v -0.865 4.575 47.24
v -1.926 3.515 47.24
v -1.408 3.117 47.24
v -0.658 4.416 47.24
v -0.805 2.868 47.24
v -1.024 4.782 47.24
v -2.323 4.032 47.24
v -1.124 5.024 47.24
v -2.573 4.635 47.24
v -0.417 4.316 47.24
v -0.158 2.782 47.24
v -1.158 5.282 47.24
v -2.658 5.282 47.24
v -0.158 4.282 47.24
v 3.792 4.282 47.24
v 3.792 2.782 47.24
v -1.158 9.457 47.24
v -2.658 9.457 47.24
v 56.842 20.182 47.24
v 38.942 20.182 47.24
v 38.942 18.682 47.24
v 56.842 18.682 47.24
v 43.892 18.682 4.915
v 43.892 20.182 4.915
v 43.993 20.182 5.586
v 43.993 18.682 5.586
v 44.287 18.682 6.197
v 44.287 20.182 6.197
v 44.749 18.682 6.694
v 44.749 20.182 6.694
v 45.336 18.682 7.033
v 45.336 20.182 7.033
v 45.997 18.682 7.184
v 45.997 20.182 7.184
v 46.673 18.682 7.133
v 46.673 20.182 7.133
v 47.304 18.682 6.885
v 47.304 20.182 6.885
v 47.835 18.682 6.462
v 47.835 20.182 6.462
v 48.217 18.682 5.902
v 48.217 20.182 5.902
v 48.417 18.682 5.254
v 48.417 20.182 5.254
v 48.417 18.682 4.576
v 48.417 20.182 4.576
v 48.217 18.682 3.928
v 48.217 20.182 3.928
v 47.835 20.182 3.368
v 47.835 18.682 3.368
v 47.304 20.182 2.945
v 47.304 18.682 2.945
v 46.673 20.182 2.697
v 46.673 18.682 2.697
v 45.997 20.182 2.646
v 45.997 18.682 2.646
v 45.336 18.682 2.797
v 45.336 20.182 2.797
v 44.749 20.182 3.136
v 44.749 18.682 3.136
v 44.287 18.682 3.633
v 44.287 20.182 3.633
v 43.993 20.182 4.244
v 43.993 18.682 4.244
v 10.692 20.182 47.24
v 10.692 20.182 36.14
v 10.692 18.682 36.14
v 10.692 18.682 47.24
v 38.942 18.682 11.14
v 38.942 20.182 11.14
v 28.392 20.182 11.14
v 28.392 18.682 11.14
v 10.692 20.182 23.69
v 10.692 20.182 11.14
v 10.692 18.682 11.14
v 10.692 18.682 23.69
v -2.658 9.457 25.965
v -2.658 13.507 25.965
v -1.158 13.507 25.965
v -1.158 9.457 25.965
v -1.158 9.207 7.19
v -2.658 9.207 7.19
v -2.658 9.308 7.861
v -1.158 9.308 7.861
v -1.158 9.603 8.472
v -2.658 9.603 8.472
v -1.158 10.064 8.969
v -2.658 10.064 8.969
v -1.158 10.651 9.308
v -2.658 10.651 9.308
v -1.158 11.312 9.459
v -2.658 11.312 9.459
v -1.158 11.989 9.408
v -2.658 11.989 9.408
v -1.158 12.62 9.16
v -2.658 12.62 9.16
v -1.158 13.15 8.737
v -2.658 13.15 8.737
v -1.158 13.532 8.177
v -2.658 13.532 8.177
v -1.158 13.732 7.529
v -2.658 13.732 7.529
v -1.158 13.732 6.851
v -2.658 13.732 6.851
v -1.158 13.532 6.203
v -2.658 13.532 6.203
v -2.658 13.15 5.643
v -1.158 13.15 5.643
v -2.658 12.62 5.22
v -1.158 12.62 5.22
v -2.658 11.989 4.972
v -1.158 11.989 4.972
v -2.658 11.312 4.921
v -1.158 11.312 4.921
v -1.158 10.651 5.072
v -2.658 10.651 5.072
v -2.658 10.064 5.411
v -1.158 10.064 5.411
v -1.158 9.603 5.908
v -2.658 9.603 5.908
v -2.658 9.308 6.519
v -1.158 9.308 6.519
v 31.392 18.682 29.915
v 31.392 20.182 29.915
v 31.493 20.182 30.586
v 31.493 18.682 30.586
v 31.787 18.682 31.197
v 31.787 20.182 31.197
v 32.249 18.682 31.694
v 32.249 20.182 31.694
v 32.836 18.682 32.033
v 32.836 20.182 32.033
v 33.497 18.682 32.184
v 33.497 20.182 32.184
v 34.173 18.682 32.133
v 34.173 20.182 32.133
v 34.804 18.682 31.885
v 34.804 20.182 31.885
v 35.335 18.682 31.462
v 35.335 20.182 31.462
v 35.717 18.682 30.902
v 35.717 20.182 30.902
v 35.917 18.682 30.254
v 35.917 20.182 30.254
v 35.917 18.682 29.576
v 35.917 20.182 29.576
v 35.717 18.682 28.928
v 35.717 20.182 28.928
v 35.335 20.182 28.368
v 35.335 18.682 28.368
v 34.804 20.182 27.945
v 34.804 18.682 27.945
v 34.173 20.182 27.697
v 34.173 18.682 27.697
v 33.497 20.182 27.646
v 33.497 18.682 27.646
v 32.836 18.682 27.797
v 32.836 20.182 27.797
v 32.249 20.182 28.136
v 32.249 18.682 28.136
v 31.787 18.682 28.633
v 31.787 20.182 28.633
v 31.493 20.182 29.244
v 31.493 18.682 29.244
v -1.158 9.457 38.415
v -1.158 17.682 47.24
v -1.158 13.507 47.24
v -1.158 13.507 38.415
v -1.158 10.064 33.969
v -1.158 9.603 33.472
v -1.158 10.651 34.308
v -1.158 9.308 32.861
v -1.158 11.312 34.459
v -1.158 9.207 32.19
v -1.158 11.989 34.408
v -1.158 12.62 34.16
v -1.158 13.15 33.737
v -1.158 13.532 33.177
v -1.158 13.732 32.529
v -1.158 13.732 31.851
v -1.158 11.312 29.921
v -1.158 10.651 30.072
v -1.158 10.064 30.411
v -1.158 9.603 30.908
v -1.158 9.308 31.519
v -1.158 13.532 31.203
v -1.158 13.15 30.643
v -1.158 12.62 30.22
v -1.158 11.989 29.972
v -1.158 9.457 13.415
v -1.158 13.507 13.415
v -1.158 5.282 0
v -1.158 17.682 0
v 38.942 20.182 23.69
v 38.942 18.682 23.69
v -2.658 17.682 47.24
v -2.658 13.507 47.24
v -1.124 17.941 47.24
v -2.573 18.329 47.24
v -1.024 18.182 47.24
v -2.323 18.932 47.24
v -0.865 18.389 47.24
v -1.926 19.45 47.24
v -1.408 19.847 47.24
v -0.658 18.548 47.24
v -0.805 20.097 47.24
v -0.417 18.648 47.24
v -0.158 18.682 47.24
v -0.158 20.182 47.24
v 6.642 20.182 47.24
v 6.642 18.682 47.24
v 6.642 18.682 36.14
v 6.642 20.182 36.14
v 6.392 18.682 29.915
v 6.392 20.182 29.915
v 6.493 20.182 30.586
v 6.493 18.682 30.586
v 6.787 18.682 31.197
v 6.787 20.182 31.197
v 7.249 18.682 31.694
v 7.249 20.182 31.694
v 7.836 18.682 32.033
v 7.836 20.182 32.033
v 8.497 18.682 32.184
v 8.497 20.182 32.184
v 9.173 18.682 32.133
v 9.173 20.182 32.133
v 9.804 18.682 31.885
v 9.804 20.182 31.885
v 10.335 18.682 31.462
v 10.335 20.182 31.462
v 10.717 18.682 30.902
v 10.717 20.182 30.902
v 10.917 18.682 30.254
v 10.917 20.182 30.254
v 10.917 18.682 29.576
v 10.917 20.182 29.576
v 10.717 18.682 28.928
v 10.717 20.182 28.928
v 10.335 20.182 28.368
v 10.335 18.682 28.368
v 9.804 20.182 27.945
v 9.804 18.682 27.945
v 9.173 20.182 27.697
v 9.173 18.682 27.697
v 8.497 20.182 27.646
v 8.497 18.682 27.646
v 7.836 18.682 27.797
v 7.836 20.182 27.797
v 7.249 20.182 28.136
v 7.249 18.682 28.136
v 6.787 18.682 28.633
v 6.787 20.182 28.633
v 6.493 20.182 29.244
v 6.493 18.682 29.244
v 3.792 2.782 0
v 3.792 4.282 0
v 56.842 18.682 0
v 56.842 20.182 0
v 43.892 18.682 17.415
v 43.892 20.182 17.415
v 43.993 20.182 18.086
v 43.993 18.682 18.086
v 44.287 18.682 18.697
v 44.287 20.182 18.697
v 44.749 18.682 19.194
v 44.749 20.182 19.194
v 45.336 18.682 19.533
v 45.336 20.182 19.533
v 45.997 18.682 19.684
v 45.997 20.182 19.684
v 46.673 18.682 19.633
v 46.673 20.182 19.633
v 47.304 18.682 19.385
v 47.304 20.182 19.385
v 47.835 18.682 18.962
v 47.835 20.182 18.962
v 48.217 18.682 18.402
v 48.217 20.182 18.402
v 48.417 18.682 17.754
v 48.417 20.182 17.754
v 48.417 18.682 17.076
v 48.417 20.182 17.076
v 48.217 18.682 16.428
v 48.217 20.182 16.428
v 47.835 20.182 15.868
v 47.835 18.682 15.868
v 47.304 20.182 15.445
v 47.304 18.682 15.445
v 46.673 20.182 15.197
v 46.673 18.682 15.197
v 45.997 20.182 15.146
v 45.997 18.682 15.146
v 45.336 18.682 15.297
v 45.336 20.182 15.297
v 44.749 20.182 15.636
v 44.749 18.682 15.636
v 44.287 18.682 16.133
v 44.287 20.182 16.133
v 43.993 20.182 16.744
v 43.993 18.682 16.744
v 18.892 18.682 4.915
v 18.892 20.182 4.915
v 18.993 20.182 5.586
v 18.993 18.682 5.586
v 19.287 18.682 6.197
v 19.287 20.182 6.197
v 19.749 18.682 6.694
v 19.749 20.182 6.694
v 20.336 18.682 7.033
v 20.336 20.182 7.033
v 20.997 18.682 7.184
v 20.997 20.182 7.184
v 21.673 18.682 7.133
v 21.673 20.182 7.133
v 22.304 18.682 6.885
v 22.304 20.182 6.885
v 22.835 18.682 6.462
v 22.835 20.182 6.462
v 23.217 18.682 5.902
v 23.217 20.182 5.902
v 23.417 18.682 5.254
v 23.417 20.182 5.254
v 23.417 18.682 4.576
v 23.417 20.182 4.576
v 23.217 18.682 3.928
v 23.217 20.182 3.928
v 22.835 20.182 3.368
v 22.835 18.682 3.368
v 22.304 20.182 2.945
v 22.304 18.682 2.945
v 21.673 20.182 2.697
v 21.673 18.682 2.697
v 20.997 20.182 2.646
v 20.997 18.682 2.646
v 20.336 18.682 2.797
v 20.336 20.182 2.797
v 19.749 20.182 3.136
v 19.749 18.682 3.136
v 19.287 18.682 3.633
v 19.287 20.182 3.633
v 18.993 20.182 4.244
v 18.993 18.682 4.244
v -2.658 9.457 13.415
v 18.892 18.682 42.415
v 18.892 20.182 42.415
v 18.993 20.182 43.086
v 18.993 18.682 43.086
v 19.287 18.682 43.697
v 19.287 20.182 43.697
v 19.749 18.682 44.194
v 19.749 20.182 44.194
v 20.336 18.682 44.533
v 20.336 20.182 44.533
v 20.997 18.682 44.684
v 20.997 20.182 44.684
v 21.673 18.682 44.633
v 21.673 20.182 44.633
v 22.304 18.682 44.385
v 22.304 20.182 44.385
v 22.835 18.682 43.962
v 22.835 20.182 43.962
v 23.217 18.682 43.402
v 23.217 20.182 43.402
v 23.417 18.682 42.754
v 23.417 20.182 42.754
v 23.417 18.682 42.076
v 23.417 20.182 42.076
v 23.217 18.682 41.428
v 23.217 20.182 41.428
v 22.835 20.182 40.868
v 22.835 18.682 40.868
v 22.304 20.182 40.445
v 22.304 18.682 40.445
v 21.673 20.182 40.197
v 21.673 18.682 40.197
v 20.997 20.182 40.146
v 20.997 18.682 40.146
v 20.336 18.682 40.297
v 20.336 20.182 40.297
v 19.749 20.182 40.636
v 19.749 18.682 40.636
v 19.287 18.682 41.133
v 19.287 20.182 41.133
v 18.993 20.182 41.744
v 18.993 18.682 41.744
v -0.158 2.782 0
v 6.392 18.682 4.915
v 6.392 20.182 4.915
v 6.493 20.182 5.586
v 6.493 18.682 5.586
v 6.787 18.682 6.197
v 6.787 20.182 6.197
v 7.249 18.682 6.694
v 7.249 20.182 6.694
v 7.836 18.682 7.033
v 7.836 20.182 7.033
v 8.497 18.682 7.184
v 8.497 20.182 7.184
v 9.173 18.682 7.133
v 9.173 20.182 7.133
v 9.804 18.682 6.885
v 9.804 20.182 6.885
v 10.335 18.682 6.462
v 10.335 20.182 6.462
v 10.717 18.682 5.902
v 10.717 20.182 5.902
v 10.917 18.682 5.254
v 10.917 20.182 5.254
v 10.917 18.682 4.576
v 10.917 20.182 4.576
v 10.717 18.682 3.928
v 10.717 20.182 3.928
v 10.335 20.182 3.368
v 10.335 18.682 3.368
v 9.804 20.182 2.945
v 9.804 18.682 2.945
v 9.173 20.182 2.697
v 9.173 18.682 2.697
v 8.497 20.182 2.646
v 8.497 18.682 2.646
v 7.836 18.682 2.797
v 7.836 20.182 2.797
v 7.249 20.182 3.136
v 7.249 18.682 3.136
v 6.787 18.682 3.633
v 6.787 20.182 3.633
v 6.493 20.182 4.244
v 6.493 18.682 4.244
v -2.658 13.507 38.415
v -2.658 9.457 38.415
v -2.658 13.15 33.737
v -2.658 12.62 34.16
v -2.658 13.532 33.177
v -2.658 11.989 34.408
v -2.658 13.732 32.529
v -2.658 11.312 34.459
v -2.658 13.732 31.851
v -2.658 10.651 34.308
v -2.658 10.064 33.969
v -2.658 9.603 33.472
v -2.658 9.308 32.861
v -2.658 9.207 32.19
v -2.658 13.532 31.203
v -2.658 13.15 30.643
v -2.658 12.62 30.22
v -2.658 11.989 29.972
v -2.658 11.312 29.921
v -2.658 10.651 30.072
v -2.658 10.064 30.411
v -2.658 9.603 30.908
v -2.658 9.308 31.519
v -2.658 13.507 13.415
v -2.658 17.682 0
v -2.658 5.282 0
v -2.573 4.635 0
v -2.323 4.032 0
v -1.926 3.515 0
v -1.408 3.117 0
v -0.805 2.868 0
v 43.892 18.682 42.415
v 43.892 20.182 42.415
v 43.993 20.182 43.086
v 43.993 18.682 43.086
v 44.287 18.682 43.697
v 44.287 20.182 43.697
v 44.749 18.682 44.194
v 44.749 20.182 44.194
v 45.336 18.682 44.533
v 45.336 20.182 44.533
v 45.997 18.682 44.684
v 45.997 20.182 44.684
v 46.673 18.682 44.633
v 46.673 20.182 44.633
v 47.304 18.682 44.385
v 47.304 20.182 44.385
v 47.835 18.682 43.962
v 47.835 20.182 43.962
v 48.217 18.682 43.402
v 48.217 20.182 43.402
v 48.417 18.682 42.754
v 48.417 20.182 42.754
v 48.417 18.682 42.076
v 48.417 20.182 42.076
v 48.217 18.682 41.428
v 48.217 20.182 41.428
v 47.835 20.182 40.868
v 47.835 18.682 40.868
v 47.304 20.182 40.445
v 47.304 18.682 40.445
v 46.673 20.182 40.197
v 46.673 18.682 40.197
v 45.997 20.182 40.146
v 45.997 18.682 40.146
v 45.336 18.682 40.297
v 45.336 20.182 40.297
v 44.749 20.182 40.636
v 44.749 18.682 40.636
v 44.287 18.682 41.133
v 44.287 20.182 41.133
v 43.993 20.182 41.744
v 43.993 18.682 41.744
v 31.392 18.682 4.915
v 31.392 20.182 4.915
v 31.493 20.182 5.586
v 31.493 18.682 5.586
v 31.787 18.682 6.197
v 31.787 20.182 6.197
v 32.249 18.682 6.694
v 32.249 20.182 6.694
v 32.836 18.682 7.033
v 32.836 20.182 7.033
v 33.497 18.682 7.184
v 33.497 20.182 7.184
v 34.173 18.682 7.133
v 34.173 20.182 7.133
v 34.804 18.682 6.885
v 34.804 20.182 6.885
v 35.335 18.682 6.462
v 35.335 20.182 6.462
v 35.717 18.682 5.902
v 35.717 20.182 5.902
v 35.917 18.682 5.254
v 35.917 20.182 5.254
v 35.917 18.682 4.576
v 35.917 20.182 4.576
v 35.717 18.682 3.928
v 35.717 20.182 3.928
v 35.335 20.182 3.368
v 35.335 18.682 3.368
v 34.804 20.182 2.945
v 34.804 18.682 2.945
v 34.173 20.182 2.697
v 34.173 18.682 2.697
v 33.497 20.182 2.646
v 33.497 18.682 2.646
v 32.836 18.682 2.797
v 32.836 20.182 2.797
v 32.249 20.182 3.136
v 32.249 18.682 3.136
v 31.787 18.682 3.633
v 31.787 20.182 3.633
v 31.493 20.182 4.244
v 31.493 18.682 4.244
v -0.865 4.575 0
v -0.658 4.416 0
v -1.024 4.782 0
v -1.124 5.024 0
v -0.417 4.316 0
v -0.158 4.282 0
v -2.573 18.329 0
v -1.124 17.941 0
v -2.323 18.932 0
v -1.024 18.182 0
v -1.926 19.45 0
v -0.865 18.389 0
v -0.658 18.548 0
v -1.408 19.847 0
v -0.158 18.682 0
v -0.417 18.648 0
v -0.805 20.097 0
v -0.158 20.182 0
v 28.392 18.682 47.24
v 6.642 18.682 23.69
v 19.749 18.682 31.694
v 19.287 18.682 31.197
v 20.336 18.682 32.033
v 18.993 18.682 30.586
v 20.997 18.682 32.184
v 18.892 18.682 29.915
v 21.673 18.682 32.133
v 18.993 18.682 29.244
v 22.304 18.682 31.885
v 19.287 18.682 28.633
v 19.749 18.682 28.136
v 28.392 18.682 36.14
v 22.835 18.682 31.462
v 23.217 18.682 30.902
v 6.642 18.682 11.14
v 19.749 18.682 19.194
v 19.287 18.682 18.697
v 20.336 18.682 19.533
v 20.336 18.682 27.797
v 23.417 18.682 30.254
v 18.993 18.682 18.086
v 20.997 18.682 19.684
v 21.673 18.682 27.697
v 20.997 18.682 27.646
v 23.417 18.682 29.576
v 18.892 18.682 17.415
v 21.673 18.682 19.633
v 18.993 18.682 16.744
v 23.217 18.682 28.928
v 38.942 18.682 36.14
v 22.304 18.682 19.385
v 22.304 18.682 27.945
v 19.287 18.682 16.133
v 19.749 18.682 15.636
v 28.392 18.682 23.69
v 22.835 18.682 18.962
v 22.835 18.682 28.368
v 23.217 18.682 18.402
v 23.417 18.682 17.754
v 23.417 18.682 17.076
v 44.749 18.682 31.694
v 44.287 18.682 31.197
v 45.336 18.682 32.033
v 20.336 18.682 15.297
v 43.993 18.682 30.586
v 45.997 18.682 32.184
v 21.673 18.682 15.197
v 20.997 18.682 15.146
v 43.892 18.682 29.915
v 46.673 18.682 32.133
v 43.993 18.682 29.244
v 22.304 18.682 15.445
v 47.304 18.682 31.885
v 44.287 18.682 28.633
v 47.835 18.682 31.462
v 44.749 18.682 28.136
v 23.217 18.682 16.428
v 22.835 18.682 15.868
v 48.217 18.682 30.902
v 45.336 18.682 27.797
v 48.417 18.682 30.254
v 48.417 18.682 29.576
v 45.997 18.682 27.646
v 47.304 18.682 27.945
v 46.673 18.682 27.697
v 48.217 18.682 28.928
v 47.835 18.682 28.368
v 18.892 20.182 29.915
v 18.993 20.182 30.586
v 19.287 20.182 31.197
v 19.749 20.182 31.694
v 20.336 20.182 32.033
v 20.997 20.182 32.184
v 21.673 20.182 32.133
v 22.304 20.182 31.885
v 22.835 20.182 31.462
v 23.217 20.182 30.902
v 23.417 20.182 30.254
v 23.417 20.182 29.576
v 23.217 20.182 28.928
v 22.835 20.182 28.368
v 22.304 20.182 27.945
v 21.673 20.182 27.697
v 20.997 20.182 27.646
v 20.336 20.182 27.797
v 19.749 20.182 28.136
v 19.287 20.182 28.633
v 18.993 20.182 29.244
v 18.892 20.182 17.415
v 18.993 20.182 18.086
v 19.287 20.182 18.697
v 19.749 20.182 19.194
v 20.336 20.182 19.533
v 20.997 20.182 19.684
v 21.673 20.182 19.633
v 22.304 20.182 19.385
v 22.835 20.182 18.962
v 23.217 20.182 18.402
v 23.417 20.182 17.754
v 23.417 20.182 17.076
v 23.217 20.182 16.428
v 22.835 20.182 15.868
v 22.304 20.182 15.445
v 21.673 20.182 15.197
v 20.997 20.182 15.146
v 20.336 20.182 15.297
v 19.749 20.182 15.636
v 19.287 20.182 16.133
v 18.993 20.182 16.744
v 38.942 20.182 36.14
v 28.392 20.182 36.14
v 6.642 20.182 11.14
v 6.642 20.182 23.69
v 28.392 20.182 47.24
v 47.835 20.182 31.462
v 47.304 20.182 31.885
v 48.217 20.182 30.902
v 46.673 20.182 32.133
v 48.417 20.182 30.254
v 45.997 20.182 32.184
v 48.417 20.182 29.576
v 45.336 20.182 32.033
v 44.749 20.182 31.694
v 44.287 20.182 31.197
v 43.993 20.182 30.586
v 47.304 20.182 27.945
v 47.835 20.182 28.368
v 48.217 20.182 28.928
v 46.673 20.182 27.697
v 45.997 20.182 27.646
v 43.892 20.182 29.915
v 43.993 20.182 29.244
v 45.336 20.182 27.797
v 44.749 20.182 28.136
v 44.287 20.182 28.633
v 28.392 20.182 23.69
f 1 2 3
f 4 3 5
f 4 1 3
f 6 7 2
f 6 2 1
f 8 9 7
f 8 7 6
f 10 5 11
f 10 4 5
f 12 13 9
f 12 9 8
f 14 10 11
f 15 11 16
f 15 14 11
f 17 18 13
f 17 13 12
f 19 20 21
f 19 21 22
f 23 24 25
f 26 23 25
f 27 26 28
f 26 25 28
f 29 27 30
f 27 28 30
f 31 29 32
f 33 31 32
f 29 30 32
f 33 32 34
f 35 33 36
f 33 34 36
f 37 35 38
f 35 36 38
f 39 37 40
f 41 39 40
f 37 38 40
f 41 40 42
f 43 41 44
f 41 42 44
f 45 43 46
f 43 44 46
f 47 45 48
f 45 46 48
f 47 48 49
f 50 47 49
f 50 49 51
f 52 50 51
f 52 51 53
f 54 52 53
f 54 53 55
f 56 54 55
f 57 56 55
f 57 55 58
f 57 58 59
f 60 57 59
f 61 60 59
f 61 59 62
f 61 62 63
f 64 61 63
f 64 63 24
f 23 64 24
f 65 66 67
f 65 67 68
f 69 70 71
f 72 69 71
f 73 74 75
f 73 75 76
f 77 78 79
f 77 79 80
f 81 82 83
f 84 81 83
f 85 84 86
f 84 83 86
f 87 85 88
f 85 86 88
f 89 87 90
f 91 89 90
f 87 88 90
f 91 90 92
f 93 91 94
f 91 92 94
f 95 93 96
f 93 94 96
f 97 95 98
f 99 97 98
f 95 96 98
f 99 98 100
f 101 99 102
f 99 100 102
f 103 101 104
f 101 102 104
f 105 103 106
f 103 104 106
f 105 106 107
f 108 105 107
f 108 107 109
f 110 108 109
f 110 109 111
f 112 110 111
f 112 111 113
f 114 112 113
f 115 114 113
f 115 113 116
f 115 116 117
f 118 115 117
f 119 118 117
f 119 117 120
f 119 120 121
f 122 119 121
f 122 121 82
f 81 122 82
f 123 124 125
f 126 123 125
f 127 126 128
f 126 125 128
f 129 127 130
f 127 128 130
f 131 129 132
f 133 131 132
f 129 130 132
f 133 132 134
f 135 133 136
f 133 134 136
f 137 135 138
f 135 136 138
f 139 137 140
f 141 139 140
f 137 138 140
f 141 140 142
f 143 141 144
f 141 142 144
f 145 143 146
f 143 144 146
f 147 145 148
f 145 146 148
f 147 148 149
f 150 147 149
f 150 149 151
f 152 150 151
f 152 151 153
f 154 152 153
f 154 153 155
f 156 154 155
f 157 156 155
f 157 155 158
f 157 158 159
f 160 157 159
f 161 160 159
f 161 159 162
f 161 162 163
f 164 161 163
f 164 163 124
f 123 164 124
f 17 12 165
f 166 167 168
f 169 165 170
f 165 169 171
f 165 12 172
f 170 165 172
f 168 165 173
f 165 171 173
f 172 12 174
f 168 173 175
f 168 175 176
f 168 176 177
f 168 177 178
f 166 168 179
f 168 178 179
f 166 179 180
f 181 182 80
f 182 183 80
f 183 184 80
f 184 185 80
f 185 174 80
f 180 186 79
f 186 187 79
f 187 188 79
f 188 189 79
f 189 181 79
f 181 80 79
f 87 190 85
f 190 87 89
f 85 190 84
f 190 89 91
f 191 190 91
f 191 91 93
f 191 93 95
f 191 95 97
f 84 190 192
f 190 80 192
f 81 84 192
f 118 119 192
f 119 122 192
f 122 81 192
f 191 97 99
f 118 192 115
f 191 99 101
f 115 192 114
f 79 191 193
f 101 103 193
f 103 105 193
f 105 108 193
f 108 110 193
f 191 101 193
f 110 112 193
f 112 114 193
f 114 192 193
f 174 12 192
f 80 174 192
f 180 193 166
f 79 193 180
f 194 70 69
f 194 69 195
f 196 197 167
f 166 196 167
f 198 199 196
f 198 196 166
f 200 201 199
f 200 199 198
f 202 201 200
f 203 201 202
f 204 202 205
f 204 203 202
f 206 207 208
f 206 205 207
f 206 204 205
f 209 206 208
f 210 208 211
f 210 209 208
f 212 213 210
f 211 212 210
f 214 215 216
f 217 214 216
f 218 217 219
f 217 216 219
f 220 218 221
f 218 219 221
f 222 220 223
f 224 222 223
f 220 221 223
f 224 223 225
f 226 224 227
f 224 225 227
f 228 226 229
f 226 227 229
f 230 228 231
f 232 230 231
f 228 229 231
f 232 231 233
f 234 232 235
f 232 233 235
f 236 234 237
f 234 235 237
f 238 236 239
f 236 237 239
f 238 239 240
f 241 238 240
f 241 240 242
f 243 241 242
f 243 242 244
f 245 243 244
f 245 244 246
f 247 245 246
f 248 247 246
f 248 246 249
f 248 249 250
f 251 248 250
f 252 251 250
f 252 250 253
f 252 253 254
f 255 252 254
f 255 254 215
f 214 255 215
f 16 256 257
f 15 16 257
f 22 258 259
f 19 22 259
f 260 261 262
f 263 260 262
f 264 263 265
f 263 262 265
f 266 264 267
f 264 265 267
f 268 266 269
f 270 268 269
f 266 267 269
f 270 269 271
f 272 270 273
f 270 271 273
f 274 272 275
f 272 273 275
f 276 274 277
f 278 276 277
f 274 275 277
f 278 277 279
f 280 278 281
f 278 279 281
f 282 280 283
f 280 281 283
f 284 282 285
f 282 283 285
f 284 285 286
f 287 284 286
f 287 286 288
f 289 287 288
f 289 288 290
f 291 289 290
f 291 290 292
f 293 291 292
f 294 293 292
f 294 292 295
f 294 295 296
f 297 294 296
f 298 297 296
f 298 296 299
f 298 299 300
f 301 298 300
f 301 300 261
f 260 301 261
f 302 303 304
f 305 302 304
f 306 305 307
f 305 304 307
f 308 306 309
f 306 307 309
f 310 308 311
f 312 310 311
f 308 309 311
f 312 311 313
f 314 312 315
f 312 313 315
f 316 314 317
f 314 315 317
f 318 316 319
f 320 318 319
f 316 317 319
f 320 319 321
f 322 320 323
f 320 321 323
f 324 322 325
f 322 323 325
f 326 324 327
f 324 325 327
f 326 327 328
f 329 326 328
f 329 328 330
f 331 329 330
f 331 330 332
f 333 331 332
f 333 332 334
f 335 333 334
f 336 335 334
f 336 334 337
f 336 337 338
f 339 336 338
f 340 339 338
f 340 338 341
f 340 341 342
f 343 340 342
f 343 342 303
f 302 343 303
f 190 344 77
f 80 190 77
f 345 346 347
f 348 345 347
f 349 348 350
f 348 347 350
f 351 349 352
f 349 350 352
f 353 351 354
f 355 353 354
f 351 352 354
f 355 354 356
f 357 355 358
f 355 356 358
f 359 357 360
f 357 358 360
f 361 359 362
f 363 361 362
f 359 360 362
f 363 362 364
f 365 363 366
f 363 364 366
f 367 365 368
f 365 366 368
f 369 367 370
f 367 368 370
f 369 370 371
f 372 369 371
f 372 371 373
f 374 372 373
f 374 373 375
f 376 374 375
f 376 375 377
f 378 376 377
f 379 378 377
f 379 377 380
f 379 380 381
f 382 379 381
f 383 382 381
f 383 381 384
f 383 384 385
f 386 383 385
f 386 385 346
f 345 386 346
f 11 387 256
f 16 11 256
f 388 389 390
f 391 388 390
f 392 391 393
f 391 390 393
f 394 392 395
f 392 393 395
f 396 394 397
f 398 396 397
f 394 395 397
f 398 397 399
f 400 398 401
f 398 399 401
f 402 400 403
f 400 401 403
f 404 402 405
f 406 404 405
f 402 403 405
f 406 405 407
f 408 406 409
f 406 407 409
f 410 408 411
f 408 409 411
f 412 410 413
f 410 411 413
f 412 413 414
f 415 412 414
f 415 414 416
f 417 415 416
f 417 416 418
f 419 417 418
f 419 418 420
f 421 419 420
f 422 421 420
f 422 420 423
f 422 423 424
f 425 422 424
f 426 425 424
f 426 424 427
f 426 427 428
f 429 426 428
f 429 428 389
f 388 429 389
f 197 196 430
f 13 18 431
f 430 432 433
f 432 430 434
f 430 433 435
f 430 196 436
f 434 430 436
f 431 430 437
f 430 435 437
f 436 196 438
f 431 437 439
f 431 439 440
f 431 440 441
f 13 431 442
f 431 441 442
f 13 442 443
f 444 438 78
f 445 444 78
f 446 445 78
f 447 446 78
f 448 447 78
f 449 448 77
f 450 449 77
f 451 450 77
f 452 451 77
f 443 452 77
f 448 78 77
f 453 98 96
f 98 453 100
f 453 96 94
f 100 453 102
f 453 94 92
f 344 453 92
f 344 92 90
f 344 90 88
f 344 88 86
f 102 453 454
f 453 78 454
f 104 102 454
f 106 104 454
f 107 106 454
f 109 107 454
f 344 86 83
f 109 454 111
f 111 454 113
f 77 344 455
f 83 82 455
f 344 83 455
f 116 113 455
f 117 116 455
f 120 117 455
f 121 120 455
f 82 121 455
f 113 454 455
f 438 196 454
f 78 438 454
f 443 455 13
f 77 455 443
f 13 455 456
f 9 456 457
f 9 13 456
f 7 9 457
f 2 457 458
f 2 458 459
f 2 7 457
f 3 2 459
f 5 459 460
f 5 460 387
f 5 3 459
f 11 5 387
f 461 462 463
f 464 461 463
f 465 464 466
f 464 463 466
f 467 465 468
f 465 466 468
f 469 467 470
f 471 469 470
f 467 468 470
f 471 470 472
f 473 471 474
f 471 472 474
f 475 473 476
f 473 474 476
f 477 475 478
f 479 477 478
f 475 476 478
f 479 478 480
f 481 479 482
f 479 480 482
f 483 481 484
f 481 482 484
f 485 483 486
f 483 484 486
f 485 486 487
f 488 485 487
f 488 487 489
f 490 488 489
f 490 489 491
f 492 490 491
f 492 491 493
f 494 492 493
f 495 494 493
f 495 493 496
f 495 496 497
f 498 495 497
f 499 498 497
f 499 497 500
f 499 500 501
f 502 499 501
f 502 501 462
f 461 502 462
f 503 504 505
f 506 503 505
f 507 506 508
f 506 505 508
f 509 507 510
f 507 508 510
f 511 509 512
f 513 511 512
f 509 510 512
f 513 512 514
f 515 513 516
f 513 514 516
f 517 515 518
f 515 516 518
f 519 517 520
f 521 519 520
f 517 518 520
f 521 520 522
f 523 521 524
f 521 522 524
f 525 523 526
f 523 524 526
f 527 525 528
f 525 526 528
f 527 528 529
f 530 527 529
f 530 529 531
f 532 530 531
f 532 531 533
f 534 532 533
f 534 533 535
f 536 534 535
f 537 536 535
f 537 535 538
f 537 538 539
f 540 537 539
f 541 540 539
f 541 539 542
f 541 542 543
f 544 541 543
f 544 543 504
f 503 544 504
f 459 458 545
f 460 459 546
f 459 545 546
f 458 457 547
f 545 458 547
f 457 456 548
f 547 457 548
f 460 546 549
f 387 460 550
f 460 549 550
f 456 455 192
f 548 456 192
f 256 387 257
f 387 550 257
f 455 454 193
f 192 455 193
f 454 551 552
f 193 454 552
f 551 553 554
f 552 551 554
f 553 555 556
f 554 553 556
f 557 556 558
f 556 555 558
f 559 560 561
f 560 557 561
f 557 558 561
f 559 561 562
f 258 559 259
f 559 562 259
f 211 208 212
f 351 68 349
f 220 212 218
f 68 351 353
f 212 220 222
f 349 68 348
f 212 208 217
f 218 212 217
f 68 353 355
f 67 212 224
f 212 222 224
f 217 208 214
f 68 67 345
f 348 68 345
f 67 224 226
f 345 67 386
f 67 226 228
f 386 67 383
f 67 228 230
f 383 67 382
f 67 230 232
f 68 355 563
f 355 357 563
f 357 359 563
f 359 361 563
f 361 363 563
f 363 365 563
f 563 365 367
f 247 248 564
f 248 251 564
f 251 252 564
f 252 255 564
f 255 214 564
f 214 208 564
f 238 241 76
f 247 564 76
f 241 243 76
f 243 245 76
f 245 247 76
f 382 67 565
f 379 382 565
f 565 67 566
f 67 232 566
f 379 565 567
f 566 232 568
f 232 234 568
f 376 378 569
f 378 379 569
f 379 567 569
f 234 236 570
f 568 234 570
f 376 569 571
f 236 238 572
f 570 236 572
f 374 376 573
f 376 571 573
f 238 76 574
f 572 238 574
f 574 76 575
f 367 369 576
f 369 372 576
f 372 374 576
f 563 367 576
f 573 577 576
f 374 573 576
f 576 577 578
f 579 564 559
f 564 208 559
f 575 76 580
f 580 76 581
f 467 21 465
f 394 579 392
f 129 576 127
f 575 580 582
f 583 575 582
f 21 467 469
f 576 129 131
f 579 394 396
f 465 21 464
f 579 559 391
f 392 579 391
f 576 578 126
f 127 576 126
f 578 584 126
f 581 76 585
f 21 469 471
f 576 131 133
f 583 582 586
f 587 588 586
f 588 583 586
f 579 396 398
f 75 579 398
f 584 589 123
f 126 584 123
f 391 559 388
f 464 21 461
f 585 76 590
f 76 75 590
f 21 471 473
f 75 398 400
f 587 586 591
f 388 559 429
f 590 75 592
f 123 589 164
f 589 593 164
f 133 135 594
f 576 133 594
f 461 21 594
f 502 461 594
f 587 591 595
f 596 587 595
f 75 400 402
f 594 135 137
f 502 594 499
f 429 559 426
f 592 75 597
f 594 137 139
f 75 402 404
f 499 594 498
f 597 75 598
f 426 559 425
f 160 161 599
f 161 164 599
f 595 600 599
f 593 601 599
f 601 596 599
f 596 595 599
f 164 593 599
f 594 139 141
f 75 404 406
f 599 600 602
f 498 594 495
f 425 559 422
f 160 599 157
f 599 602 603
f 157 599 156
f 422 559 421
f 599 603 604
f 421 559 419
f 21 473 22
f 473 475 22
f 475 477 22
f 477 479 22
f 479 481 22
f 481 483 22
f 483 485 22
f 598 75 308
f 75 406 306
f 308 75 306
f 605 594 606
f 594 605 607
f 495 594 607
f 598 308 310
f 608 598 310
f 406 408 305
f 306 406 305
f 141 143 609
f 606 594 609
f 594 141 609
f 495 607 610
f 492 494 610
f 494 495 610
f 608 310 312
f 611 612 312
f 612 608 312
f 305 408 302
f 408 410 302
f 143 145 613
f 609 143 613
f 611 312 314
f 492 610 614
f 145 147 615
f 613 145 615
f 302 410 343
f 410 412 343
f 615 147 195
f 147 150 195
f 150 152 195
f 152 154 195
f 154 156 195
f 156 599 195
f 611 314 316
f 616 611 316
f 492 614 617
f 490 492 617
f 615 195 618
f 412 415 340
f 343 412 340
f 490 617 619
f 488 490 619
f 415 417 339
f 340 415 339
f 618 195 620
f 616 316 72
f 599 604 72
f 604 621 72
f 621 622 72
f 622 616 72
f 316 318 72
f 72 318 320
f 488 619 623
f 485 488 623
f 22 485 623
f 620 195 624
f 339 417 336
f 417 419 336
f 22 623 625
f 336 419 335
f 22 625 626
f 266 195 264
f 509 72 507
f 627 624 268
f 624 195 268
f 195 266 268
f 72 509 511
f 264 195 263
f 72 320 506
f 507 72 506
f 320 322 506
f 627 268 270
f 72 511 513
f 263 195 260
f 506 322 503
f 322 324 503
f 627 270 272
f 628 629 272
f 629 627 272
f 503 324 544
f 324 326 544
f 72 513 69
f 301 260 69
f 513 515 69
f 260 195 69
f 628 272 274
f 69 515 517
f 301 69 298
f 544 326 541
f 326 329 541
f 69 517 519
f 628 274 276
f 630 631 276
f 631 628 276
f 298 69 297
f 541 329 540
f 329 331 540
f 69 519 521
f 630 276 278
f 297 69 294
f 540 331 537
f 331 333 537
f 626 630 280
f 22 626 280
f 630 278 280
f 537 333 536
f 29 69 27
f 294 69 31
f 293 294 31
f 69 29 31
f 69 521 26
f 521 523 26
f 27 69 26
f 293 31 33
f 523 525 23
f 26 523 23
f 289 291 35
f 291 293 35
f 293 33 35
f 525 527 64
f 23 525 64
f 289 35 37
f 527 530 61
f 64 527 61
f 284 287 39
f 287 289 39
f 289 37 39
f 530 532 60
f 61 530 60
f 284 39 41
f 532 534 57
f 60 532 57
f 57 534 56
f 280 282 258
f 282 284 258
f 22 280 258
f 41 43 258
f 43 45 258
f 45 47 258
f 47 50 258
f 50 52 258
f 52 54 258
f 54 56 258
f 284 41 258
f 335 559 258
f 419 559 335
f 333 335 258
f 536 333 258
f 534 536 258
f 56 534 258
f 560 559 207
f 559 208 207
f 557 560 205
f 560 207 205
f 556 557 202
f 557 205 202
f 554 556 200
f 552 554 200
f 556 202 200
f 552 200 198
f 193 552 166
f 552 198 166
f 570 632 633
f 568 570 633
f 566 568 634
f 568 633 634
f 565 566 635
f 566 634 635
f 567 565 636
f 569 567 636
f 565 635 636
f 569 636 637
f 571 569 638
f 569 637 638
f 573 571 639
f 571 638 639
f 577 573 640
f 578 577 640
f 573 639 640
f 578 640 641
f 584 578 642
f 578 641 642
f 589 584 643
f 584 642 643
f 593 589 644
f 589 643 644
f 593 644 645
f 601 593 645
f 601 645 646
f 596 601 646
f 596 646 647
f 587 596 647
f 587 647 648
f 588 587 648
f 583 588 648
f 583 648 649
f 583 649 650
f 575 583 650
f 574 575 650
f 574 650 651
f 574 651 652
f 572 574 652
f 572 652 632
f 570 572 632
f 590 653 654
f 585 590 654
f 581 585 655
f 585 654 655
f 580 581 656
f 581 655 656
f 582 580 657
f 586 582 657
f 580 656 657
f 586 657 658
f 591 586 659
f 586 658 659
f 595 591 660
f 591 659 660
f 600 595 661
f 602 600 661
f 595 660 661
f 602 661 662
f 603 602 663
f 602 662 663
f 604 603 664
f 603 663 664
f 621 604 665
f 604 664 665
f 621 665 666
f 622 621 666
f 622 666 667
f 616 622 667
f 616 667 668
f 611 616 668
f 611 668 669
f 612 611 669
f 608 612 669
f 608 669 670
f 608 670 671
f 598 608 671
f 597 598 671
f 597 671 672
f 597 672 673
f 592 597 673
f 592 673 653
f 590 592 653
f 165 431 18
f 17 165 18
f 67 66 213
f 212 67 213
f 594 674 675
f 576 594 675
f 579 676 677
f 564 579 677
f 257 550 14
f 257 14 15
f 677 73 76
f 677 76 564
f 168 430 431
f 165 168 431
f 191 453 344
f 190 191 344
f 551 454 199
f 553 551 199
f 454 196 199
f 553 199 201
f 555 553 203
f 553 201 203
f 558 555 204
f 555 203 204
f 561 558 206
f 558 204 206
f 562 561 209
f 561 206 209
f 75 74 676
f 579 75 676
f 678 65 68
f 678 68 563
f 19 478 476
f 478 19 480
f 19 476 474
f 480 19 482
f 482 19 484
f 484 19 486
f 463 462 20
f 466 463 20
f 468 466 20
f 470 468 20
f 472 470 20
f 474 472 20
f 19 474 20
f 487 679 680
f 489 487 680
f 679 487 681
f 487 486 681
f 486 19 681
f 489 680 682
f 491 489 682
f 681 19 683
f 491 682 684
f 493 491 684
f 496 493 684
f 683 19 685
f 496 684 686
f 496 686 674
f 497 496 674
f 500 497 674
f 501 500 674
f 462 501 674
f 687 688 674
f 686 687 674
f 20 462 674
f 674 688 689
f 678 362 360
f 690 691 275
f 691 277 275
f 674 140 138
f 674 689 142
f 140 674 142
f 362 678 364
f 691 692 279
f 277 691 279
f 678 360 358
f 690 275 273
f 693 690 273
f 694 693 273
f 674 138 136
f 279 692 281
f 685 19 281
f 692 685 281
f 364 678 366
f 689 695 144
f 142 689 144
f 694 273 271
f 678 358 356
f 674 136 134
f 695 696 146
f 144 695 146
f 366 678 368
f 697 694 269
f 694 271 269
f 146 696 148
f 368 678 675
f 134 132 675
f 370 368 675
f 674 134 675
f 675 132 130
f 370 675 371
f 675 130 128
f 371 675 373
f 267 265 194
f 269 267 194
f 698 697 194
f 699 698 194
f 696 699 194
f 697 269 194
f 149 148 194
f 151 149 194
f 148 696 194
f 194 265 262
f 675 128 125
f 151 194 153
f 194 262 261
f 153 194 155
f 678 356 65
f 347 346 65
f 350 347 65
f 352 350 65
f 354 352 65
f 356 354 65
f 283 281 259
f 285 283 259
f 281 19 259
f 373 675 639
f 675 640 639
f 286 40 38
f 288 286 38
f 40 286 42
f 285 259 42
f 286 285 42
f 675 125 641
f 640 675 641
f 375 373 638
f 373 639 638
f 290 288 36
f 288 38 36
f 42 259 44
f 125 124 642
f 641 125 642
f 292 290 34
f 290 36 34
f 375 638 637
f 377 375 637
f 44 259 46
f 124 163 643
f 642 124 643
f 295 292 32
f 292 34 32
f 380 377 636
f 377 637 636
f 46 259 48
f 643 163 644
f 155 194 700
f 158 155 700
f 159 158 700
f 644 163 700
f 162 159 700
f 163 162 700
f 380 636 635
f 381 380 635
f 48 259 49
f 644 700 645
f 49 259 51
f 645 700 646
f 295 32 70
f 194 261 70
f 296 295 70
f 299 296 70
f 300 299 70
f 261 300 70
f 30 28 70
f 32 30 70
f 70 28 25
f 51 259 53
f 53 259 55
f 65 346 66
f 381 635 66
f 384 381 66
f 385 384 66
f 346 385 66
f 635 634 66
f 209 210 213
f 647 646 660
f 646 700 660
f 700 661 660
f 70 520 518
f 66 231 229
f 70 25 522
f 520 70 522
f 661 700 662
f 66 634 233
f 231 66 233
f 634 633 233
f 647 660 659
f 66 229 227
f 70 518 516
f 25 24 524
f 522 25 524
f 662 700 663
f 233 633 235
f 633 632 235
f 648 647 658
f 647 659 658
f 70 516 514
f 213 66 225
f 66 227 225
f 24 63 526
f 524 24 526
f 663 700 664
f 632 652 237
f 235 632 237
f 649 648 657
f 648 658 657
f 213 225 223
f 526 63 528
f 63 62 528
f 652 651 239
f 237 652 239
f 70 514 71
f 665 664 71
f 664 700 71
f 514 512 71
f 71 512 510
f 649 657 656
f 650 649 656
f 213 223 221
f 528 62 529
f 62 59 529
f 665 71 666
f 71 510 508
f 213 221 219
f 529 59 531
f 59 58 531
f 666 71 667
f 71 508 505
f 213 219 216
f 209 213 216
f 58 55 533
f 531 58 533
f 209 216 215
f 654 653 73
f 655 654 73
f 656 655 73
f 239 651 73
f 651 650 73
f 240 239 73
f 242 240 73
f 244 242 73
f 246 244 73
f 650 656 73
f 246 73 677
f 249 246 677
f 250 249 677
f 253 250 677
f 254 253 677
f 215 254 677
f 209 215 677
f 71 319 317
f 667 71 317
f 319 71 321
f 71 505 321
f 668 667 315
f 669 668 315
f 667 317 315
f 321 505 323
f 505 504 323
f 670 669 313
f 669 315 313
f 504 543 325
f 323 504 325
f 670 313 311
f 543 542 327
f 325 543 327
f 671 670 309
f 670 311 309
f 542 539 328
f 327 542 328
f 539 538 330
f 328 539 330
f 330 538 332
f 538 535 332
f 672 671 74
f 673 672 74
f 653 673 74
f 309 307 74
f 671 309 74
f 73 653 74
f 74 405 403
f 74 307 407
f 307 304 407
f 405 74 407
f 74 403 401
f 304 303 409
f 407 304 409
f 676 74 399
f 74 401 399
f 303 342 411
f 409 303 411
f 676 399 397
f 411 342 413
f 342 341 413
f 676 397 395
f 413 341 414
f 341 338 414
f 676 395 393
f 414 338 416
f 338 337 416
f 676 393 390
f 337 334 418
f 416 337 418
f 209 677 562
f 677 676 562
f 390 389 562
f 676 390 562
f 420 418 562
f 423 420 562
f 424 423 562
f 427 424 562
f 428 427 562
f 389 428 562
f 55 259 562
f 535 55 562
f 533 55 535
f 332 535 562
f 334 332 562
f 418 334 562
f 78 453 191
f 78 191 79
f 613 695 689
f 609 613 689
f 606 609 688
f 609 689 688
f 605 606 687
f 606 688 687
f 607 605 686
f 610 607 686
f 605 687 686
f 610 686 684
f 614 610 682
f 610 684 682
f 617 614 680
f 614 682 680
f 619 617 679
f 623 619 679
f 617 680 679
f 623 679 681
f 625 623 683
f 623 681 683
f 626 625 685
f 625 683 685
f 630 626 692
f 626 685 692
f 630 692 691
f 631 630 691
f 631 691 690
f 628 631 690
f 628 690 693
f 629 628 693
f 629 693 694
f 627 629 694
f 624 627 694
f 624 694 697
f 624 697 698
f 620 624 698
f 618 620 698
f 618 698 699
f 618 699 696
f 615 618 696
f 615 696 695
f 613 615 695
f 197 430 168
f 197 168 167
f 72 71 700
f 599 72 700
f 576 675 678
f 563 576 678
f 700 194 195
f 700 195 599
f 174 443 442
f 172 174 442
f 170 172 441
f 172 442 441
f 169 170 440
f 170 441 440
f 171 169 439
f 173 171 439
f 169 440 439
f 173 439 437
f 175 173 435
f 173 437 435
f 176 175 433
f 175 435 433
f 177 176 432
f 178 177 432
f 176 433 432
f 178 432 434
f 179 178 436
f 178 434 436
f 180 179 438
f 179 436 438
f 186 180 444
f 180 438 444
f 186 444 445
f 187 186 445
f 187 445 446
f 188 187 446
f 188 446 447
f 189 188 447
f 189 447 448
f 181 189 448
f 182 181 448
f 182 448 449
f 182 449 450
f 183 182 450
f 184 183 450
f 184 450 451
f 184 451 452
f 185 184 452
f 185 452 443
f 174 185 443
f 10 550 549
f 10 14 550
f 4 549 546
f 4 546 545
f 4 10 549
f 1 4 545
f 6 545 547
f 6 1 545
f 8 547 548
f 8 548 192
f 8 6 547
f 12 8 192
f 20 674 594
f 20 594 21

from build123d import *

# Parameters (mm, degrees)
F0_W     = 1.5
F0_H     = 1.5
F0_W_2   = 58
F0_H_2   = 14.4
F0_W_3   = 4.95
F1_DEPTH = 47.24
F2_R     = 2.5
F3_R     = 1
F4_R     = 2.275
F4_W     = 10.55
F4_H     = 12.55
F4_W_2   = 4.05
F5_DEPTH = 17.401
F6_W     = 4.05
F6_H     = 8.825
F6_R     = 2.275
F6_H_2   = 12.55
F7_DEPTH = 25


with BuildPart() as f1:
    # F0 (on Top) → F1 (new body)
    with BuildSketch(Plane.XY):
        with Locations((-1.908001, 19.432347)):
            Rectangle(F0_W, F0_H)
        with Locations((27.841999, 19.432347)):
            Rectangle(F0_W_2, F0_H)
        with Locations((-1.908001, 11.482347)):
            Rectangle(F0_W, F0_H_2)
        with Locations((-1.908001, 3.532347)):
            Rectangle(F0_W, F0_H)
        with Locations((1.316999, 3.532347)):
            Rectangle(F0_W_3, F0_H)
    extrude(amount=F1_DEPTH)

    # F2
    f2_edges = [f1.edges().sort_by_distance(p)[0] for p in [
        (-2.658001, 20.182347, 23.62),
        (-2.658001, 2.782347, 23.62),
    ]]
    fillet(f2_edges, radius=F2_R)

    # F3
    f3_edges = [f1.edges().sort_by_distance(p)[0] for p in [
        (-1.158001, 4.282347, 23.62),
        (-1.158001, 18.682347, 23.62),
    ]]
    fillet(f3_edges, radius=F3_R)

    # F4 (on face) → F5 (cut, through all)
    with BuildSketch(Plane(origin=(0, 20.182347, 0), x_dir=(-1, 0, 0), z_dir=(0, 1, 0))):
        with Locations((-46.166999, 42.415)):
            Circle(F4_R)
        with Locations((-21.166999, 42.415)):
            Circle(F4_R)
        with Locations((-21.166999, 29.915)):
            Circle(F4_R)
        with Locations((-46.166999, 29.915)):
            Circle(F4_R)
        with Locations((-21.166999, 17.415)):
            Circle(F4_R)
        with Locations((-46.166999, 17.415)):
            Circle(F4_R)
        with Locations((-21.166999, 4.915)):
            Circle(F4_R)
        with Locations((-46.166999, 4.915)):
            Circle(F4_R)
        with Locations((-33.666999, 29.915)):
            Circle(F4_R)
        with Locations((-33.666999, 4.915)):
            Circle(F4_R)
        with Locations((-8.666999, 29.915)):
            Circle(F4_R)
        with Locations((-8.666999, 4.915)):
            Circle(F4_R)
        with Locations((-33.666999, 17.415)):
            Rectangle(F4_W, F4_H)
        with Locations((-33.666999, 42.415)):
            Rectangle(F4_W, F4_H)
        with Locations((-8.666999, 17.415)):
            Rectangle(F4_W_2, F4_H)
        with Locations((-8.666999, 42.415)):
            Rectangle(F4_W_2, F4_H)
    extrude(amount=-F5_DEPTH, mode=Mode.SUBTRACT)

    # F6 (on face) → F7 (cut)
    with BuildSketch(Plane(origin=(-2.658001, 0, 0), x_dir=(0, -1, 0), z_dir=(-1, 0, 0))):
        with Locations((-11.482347, 42.8275)):
            Rectangle(F6_W, F6_H)
        with Locations((-11.482347, 32.19)):
            Circle(F6_R)
        with Locations((-11.482347, 19.69)):
            Rectangle(F6_W, F6_H_2)
        with Locations((-11.482347, 7.19)):
            Circle(F6_R)
    extrude(amount=-F7_DEPTH, mode=Mode.SUBTRACT)


solid = f1.part
